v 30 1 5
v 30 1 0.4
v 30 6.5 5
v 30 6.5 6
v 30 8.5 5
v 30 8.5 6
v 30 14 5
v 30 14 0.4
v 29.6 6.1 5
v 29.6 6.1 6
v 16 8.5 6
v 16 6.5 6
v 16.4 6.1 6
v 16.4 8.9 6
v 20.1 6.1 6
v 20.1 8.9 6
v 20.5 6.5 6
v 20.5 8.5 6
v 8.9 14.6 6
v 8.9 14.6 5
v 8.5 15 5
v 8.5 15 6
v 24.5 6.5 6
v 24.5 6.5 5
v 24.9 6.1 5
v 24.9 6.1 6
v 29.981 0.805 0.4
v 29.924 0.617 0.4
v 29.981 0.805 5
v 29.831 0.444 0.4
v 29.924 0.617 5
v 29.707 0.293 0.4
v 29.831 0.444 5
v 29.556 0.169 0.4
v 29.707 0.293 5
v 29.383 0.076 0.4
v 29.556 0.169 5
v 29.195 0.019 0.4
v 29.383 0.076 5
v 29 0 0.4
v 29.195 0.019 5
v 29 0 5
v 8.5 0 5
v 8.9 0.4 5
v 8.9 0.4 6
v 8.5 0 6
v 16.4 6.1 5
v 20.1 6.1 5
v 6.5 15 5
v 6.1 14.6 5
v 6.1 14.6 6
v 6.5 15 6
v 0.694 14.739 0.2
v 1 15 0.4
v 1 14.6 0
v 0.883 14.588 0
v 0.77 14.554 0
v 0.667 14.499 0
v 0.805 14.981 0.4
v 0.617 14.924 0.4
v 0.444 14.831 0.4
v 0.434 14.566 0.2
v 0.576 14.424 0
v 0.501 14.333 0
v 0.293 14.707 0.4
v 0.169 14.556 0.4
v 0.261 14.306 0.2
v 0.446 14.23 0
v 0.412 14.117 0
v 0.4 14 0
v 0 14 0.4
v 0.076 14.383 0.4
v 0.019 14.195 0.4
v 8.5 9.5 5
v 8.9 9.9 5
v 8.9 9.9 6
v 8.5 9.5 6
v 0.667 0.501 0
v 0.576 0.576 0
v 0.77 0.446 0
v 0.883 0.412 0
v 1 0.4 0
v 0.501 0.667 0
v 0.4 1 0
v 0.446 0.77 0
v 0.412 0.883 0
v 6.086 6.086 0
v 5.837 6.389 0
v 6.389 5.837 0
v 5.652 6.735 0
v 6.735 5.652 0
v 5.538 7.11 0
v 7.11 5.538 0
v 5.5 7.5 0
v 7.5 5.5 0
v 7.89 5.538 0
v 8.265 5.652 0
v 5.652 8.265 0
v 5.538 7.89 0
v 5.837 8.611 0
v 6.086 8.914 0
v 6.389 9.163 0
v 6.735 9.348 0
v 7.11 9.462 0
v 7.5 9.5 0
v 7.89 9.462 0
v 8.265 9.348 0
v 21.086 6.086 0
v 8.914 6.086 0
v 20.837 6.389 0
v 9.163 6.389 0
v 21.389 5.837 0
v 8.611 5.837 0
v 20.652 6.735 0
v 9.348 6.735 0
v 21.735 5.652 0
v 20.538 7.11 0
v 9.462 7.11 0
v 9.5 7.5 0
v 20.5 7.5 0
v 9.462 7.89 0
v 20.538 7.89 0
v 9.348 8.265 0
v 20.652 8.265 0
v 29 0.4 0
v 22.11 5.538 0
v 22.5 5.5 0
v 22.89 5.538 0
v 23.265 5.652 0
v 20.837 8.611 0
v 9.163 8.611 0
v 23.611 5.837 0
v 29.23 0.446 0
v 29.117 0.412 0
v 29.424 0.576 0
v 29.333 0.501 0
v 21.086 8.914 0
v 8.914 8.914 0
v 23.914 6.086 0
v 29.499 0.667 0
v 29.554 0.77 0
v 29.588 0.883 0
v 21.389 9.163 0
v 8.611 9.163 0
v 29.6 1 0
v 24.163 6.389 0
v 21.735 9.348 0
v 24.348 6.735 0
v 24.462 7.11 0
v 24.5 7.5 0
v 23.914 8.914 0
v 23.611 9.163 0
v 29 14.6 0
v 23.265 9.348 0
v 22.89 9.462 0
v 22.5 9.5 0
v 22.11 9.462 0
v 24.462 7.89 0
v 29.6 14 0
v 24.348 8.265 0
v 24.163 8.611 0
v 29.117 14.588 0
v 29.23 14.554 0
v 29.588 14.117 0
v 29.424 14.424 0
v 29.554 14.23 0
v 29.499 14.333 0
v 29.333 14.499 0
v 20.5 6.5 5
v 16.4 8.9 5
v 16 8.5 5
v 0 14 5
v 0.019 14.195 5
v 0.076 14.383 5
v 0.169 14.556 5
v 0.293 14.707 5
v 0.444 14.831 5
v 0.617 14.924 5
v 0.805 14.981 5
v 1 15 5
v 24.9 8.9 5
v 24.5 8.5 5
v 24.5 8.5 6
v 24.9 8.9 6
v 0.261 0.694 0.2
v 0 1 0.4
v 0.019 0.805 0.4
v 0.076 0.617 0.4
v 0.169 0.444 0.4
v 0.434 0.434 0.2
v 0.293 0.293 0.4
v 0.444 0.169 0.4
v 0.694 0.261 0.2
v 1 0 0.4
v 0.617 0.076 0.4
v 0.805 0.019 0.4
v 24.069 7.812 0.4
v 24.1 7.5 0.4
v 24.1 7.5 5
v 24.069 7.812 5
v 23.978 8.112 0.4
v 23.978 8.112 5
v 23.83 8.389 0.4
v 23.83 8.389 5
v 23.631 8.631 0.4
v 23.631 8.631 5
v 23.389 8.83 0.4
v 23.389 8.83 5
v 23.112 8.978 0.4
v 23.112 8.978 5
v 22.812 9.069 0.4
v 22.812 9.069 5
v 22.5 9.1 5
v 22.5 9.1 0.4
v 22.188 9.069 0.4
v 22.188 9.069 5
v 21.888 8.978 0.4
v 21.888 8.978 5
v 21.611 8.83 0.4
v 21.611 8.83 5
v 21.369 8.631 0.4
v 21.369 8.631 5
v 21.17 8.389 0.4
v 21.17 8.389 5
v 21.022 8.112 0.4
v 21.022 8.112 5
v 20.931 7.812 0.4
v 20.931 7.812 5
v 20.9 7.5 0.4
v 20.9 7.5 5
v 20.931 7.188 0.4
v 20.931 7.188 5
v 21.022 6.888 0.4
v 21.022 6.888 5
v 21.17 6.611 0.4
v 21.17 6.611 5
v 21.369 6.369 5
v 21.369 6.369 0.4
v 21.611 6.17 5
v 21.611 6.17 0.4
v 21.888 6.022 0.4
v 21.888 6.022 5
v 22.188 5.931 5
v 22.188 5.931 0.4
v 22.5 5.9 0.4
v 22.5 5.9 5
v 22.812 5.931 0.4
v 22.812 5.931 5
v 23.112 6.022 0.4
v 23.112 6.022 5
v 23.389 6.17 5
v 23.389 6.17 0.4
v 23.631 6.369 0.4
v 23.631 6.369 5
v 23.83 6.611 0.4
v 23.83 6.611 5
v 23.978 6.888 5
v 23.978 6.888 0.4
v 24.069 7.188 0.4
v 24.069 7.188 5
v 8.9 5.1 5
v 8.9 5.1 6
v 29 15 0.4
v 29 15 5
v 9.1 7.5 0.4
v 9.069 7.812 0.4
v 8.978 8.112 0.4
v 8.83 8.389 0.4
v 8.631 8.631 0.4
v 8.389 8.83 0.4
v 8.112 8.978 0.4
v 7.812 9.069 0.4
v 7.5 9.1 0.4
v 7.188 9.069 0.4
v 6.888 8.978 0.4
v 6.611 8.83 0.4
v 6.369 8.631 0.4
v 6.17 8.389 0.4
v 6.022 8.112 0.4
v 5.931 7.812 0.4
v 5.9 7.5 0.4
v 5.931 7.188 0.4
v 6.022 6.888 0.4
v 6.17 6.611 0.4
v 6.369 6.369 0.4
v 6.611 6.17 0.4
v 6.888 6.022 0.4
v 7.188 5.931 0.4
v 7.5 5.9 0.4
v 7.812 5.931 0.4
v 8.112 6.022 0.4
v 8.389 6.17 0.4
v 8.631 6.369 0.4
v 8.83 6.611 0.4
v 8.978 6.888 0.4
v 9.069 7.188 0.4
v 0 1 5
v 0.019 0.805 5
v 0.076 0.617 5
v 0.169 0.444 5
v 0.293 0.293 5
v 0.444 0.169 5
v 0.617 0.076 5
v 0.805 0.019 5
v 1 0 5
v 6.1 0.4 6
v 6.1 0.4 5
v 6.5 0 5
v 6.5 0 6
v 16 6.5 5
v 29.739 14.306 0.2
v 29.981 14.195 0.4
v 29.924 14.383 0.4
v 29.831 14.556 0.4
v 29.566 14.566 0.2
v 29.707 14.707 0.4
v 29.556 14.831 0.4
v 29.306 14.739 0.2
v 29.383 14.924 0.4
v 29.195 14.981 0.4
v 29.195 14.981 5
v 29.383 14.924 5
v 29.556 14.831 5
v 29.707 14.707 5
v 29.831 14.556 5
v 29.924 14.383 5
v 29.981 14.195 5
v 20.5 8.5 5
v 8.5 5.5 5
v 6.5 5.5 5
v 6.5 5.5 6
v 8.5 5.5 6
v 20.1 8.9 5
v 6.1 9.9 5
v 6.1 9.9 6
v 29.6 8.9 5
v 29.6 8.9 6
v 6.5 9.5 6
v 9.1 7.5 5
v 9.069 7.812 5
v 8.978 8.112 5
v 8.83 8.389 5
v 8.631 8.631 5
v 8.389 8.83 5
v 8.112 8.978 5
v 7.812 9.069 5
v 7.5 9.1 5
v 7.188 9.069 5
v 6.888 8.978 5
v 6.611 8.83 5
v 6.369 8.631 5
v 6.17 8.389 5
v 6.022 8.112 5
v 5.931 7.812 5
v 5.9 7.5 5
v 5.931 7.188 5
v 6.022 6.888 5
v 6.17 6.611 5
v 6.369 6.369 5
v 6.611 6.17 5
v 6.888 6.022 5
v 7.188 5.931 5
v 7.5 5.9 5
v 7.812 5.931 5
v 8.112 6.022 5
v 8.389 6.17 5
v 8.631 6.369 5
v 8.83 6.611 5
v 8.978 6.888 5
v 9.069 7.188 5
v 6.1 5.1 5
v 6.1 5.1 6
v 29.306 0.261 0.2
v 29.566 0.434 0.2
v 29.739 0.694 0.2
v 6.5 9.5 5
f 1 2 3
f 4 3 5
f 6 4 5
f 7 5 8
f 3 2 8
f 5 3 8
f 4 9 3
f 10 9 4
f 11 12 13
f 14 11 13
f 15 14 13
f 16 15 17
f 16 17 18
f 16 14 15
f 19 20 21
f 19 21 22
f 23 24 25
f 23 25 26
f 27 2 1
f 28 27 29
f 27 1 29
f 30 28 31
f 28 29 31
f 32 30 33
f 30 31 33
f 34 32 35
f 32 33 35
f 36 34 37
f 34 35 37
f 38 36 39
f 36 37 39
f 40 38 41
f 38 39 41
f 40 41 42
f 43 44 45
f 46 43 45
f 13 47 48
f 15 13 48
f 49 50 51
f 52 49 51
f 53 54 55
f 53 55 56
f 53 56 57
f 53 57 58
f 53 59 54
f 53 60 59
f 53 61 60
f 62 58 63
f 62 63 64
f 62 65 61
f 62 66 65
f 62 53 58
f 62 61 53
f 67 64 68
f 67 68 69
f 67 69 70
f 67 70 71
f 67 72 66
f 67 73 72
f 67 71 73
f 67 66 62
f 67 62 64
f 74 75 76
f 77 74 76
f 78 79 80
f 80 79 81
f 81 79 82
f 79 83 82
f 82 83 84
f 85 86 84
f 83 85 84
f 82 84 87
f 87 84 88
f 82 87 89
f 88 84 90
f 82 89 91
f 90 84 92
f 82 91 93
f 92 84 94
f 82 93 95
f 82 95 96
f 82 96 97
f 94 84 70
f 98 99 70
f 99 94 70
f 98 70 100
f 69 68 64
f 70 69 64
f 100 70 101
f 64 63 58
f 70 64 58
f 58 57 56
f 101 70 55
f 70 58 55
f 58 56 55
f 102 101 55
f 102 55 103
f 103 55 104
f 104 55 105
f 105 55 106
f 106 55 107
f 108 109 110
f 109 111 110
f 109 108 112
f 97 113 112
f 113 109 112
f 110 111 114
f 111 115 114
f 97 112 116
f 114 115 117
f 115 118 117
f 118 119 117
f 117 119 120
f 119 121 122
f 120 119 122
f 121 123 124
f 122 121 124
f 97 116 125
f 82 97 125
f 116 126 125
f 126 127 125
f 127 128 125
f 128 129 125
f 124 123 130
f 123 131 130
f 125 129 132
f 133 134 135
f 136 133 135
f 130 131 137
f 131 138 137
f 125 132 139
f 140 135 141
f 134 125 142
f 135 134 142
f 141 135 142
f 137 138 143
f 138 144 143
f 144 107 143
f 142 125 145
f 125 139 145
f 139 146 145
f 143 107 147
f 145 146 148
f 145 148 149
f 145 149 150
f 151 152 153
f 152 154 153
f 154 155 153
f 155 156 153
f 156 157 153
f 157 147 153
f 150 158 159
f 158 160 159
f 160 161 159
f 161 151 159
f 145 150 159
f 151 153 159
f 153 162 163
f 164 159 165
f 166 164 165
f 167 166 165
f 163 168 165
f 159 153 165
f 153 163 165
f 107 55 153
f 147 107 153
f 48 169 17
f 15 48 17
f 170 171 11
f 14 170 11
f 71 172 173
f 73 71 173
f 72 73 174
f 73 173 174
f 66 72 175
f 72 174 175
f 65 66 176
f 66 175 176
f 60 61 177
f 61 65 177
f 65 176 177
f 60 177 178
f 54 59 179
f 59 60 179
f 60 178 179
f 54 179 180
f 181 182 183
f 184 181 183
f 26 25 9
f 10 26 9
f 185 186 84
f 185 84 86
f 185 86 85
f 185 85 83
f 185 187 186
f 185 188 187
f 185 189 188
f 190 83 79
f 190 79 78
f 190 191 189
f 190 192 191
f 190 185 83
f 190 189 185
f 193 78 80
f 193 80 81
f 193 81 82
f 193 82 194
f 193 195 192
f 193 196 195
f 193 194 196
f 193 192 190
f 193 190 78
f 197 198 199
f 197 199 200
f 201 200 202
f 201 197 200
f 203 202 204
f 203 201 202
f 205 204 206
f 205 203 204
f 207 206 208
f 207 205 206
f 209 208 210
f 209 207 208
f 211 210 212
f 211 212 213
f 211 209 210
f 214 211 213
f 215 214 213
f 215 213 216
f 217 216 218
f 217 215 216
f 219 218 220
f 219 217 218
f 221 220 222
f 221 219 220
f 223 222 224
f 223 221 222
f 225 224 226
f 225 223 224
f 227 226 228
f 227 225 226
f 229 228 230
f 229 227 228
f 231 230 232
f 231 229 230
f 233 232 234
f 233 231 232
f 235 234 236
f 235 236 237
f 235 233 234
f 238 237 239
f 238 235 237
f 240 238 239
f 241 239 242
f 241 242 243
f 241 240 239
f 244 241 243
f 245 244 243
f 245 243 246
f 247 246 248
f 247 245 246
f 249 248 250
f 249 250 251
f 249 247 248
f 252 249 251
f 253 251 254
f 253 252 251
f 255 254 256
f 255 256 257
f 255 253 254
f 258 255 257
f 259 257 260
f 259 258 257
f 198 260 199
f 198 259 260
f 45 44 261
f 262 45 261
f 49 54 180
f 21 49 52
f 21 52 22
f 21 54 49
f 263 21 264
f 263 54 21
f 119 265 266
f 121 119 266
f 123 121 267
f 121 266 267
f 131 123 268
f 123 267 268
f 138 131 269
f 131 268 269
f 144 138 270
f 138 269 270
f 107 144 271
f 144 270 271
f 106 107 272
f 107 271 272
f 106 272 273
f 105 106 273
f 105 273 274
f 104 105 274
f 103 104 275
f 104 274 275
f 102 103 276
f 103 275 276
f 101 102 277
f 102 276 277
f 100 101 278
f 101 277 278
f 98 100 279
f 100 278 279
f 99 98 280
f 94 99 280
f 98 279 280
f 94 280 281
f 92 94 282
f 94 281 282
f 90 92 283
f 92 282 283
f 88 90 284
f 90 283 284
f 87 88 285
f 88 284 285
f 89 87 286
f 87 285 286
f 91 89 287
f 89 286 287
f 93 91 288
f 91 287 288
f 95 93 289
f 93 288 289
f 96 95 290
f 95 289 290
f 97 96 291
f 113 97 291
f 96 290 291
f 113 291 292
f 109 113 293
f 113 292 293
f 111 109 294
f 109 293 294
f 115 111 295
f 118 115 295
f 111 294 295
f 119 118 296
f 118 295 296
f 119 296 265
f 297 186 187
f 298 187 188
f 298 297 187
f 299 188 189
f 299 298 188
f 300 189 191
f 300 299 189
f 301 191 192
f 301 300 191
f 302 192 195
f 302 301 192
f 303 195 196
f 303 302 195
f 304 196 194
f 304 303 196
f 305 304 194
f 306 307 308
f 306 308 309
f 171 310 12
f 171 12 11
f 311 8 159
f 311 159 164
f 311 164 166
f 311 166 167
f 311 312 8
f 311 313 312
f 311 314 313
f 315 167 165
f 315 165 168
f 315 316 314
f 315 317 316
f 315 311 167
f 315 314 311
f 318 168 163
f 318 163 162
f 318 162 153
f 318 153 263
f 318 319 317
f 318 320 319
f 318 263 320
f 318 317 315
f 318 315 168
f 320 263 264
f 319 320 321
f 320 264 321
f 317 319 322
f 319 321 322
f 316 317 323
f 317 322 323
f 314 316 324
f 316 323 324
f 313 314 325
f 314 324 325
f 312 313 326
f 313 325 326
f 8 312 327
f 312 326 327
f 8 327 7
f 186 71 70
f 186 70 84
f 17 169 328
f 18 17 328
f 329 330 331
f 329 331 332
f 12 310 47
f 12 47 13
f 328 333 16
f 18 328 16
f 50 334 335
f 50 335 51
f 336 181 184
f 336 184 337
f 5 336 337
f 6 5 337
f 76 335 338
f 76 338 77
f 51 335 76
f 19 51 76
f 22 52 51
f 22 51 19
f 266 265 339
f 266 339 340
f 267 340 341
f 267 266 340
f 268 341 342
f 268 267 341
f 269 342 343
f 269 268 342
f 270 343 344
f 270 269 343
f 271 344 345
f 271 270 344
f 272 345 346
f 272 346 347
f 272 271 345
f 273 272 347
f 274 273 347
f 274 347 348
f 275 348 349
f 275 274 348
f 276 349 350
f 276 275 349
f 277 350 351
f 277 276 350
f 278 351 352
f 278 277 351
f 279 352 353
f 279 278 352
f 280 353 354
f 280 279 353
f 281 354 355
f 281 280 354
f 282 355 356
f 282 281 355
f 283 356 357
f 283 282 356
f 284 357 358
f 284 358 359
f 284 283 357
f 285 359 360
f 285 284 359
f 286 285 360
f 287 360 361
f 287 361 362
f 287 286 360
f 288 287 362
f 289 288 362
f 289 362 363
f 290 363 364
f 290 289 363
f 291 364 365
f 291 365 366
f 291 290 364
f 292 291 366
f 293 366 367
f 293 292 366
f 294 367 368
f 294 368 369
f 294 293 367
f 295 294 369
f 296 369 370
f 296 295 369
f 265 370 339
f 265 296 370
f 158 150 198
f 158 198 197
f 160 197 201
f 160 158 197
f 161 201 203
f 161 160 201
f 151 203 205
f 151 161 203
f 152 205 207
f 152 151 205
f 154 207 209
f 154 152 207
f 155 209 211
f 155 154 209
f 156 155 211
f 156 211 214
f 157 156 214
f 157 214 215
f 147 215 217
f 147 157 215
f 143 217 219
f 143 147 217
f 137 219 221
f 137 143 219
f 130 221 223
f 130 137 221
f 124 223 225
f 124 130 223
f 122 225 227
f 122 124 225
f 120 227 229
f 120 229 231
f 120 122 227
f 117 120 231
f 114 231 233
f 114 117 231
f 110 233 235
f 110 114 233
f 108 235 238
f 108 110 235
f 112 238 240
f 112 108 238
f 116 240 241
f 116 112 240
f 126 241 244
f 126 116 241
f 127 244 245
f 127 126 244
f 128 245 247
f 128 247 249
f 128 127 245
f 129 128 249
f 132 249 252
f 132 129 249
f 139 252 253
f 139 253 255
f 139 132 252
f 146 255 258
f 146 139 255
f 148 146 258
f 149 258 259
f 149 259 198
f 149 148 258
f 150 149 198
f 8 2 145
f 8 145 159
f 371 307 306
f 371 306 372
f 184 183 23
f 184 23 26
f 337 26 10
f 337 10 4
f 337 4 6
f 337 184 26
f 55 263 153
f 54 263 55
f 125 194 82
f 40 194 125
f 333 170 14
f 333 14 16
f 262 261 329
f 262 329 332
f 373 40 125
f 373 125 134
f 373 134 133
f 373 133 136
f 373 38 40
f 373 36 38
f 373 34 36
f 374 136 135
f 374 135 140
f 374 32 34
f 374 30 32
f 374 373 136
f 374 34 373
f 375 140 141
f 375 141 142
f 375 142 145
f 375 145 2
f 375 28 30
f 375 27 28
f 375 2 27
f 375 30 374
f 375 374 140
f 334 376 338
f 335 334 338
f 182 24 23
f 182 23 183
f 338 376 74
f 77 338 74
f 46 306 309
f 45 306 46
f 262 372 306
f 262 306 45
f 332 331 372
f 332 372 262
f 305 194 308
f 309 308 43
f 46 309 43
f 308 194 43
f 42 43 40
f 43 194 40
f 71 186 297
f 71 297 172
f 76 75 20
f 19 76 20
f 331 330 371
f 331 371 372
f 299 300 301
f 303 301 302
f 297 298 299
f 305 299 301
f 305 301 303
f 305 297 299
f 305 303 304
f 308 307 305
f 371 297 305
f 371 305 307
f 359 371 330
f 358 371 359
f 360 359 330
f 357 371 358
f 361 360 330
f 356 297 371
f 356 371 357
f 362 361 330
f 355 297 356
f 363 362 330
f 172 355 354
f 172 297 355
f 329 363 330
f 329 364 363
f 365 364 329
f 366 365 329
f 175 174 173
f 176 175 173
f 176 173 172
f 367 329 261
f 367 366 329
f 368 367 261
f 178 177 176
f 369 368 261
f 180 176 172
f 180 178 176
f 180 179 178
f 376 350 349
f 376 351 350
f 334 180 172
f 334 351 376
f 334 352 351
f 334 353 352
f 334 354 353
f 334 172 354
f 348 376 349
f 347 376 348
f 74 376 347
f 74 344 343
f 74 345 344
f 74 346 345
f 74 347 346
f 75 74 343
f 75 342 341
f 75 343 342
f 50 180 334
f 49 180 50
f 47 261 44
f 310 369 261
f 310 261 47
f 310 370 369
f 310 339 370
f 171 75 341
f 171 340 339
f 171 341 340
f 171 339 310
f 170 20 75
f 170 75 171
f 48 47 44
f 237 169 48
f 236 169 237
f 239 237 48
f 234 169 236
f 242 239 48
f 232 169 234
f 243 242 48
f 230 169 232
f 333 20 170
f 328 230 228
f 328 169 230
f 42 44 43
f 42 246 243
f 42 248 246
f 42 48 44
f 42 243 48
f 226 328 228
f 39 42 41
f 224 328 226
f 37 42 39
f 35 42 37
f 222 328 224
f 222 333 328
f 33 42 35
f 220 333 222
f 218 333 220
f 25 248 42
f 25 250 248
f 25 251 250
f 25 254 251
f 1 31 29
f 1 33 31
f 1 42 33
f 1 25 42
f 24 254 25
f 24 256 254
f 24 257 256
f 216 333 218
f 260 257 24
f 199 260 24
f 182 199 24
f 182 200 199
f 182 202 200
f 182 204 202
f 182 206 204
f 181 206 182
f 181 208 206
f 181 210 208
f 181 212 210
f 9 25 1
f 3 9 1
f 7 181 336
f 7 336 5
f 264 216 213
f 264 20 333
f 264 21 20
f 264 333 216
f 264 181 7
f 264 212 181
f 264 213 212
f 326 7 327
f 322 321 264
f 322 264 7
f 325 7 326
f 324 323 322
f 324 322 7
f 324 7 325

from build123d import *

# Parameters (mm, degrees)
SKETCH039_W                                      = 30
SKETCH039_H                                      = 15
SKETCH039_R                                      = 1.6
PAD008_DEPTH                                     = 5
SKETCH040_W                                      = 4.5
SKETCH040_H                                      = 2.8
SKETCH040_W_2                                    = 5.5
SKETCH040_W_3                                    = 2.8
SKETCH040_H_2                                    = 5.5
PAD009_DEPTH                                     = 1
PAD010_DEPTH                                     = 1
FILLET002_R                                      = 1
CHAMFER004013007011015006009007001005003045_SIZE = 0.4
CHAMFER004013007011015006009007001005003046_SIZE = 0.4


with BuildPart() as part:
    # Sketch039 → Pad008 (new body)
    with BuildSketch(Plane.XY):
        with Locations((15, 7.5)):
            Rectangle(SKETCH039_W, SKETCH039_H)
        with Locations((7.5, 7.5)):
            Circle(SKETCH039_R, mode=Mode.SUBTRACT)
        with Locations((22.5, 7.5)):
            Circle(SKETCH039_R, mode=Mode.SUBTRACT)
    extrude(amount=PAD008_DEPTH)

    # Sketch040 (on Face8 of Pad008) → Pad009 (join)
    with BuildSketch(Plane.XY.offset(5)):
        with Locations((18.25, 7.5)):
            Rectangle(SKETCH040_W, SKETCH040_H)
        with Locations((27.25, 7.5)):
            Rectangle(SKETCH040_W_2, SKETCH040_H)
        with Locations((7.5, 12.25)):
            Rectangle(SKETCH040_W_3, SKETCH040_H_2)
        with Locations((7.5, 2.75)):
            Rectangle(SKETCH040_W_3, SKETCH040_H_2)
    extrude(amount=PAD009_DEPTH)

    # Sketch040 (on Face8 of Pad008) → Pad010 (join)
    with BuildSketch(Plane.XY.offset(5)):
        with Locations((18.25, 7.5)):
            Rectangle(SKETCH040_W, SKETCH040_H)
        with Locations((27.25, 7.5)):
            Rectangle(SKETCH040_W_2, SKETCH040_H)
        with Locations((7.5, 12.25)):
            Rectangle(SKETCH040_W_3, SKETCH040_H_2)
        with Locations((7.5, 2.75)):
            Rectangle(SKETCH040_W_3, SKETCH040_H_2)
    extrude(amount=PAD010_DEPTH)

    # Fillet002
    fillet002_edges = [part.edges().sort_by_distance(p)[0] for p in [
        (30, 0, 2.5),
        (30, 15, 2.5),
        (0, 15, 2.5),
        (0, 0, 2.5),
    ]]
    fillet(fillet002_edges, radius=FILLET002_R)

    # Chamfer004013007011015006009007001005003045
    chamfer004013007011015006009007001005003045_edges = [part.edges().sort_by_distance(p)[0] for p in [
        (30, 8.9, 5.5),
        (24.5, 8.9, 5.5),
        (20.5, 8.9, 5.5),
        (16, 8.9, 5.5),
        (16, 6.1, 5.5),
        (8.9, 15, 5.5),
        (6.1, 15, 5.5),
        (8.9, 5.5, 5.5),
        (6.1, 5.5, 5.5),
        (6.1, 9.5, 5.5),
        (6.1, 0, 5.5),
        (8.9, 9.5, 5.5),
        (8.9, 0, 5.5),
        (20.5, 6.1, 5.5),
        (24.5, 6.1, 5.5),
        (30, 6.1, 5.5),
    ]]
    chamfer(chamfer004013007011015006009007001005003045_edges, length=CHAMFER004013007011015006009007001005003045_SIZE)

    # Chamfer004013007011015006009007001005003046
    chamfer004013007011015006009007001005003046_edges = [part.edges().sort_by_distance(p)[0] for p in [
        (15, 0, 0),
        (29.707107, 0.292893, 0),
        (30, 7.5, 0),
        (29.707107, 14.707107, 0),
        (15, 15, 0),
        (0.292893, 14.707107, 0),
        (0, 7.5, 0),
        (0.292893, 0.292893, 0),
        (20.9, 7.5, 0),
        (5.9, 7.5, 0),
    ]]
    chamfer(chamfer004013007011015006009007001005003046_edges, length=CHAMFER004013007011015006009007001005003046_SIZE)


solid = part.part
